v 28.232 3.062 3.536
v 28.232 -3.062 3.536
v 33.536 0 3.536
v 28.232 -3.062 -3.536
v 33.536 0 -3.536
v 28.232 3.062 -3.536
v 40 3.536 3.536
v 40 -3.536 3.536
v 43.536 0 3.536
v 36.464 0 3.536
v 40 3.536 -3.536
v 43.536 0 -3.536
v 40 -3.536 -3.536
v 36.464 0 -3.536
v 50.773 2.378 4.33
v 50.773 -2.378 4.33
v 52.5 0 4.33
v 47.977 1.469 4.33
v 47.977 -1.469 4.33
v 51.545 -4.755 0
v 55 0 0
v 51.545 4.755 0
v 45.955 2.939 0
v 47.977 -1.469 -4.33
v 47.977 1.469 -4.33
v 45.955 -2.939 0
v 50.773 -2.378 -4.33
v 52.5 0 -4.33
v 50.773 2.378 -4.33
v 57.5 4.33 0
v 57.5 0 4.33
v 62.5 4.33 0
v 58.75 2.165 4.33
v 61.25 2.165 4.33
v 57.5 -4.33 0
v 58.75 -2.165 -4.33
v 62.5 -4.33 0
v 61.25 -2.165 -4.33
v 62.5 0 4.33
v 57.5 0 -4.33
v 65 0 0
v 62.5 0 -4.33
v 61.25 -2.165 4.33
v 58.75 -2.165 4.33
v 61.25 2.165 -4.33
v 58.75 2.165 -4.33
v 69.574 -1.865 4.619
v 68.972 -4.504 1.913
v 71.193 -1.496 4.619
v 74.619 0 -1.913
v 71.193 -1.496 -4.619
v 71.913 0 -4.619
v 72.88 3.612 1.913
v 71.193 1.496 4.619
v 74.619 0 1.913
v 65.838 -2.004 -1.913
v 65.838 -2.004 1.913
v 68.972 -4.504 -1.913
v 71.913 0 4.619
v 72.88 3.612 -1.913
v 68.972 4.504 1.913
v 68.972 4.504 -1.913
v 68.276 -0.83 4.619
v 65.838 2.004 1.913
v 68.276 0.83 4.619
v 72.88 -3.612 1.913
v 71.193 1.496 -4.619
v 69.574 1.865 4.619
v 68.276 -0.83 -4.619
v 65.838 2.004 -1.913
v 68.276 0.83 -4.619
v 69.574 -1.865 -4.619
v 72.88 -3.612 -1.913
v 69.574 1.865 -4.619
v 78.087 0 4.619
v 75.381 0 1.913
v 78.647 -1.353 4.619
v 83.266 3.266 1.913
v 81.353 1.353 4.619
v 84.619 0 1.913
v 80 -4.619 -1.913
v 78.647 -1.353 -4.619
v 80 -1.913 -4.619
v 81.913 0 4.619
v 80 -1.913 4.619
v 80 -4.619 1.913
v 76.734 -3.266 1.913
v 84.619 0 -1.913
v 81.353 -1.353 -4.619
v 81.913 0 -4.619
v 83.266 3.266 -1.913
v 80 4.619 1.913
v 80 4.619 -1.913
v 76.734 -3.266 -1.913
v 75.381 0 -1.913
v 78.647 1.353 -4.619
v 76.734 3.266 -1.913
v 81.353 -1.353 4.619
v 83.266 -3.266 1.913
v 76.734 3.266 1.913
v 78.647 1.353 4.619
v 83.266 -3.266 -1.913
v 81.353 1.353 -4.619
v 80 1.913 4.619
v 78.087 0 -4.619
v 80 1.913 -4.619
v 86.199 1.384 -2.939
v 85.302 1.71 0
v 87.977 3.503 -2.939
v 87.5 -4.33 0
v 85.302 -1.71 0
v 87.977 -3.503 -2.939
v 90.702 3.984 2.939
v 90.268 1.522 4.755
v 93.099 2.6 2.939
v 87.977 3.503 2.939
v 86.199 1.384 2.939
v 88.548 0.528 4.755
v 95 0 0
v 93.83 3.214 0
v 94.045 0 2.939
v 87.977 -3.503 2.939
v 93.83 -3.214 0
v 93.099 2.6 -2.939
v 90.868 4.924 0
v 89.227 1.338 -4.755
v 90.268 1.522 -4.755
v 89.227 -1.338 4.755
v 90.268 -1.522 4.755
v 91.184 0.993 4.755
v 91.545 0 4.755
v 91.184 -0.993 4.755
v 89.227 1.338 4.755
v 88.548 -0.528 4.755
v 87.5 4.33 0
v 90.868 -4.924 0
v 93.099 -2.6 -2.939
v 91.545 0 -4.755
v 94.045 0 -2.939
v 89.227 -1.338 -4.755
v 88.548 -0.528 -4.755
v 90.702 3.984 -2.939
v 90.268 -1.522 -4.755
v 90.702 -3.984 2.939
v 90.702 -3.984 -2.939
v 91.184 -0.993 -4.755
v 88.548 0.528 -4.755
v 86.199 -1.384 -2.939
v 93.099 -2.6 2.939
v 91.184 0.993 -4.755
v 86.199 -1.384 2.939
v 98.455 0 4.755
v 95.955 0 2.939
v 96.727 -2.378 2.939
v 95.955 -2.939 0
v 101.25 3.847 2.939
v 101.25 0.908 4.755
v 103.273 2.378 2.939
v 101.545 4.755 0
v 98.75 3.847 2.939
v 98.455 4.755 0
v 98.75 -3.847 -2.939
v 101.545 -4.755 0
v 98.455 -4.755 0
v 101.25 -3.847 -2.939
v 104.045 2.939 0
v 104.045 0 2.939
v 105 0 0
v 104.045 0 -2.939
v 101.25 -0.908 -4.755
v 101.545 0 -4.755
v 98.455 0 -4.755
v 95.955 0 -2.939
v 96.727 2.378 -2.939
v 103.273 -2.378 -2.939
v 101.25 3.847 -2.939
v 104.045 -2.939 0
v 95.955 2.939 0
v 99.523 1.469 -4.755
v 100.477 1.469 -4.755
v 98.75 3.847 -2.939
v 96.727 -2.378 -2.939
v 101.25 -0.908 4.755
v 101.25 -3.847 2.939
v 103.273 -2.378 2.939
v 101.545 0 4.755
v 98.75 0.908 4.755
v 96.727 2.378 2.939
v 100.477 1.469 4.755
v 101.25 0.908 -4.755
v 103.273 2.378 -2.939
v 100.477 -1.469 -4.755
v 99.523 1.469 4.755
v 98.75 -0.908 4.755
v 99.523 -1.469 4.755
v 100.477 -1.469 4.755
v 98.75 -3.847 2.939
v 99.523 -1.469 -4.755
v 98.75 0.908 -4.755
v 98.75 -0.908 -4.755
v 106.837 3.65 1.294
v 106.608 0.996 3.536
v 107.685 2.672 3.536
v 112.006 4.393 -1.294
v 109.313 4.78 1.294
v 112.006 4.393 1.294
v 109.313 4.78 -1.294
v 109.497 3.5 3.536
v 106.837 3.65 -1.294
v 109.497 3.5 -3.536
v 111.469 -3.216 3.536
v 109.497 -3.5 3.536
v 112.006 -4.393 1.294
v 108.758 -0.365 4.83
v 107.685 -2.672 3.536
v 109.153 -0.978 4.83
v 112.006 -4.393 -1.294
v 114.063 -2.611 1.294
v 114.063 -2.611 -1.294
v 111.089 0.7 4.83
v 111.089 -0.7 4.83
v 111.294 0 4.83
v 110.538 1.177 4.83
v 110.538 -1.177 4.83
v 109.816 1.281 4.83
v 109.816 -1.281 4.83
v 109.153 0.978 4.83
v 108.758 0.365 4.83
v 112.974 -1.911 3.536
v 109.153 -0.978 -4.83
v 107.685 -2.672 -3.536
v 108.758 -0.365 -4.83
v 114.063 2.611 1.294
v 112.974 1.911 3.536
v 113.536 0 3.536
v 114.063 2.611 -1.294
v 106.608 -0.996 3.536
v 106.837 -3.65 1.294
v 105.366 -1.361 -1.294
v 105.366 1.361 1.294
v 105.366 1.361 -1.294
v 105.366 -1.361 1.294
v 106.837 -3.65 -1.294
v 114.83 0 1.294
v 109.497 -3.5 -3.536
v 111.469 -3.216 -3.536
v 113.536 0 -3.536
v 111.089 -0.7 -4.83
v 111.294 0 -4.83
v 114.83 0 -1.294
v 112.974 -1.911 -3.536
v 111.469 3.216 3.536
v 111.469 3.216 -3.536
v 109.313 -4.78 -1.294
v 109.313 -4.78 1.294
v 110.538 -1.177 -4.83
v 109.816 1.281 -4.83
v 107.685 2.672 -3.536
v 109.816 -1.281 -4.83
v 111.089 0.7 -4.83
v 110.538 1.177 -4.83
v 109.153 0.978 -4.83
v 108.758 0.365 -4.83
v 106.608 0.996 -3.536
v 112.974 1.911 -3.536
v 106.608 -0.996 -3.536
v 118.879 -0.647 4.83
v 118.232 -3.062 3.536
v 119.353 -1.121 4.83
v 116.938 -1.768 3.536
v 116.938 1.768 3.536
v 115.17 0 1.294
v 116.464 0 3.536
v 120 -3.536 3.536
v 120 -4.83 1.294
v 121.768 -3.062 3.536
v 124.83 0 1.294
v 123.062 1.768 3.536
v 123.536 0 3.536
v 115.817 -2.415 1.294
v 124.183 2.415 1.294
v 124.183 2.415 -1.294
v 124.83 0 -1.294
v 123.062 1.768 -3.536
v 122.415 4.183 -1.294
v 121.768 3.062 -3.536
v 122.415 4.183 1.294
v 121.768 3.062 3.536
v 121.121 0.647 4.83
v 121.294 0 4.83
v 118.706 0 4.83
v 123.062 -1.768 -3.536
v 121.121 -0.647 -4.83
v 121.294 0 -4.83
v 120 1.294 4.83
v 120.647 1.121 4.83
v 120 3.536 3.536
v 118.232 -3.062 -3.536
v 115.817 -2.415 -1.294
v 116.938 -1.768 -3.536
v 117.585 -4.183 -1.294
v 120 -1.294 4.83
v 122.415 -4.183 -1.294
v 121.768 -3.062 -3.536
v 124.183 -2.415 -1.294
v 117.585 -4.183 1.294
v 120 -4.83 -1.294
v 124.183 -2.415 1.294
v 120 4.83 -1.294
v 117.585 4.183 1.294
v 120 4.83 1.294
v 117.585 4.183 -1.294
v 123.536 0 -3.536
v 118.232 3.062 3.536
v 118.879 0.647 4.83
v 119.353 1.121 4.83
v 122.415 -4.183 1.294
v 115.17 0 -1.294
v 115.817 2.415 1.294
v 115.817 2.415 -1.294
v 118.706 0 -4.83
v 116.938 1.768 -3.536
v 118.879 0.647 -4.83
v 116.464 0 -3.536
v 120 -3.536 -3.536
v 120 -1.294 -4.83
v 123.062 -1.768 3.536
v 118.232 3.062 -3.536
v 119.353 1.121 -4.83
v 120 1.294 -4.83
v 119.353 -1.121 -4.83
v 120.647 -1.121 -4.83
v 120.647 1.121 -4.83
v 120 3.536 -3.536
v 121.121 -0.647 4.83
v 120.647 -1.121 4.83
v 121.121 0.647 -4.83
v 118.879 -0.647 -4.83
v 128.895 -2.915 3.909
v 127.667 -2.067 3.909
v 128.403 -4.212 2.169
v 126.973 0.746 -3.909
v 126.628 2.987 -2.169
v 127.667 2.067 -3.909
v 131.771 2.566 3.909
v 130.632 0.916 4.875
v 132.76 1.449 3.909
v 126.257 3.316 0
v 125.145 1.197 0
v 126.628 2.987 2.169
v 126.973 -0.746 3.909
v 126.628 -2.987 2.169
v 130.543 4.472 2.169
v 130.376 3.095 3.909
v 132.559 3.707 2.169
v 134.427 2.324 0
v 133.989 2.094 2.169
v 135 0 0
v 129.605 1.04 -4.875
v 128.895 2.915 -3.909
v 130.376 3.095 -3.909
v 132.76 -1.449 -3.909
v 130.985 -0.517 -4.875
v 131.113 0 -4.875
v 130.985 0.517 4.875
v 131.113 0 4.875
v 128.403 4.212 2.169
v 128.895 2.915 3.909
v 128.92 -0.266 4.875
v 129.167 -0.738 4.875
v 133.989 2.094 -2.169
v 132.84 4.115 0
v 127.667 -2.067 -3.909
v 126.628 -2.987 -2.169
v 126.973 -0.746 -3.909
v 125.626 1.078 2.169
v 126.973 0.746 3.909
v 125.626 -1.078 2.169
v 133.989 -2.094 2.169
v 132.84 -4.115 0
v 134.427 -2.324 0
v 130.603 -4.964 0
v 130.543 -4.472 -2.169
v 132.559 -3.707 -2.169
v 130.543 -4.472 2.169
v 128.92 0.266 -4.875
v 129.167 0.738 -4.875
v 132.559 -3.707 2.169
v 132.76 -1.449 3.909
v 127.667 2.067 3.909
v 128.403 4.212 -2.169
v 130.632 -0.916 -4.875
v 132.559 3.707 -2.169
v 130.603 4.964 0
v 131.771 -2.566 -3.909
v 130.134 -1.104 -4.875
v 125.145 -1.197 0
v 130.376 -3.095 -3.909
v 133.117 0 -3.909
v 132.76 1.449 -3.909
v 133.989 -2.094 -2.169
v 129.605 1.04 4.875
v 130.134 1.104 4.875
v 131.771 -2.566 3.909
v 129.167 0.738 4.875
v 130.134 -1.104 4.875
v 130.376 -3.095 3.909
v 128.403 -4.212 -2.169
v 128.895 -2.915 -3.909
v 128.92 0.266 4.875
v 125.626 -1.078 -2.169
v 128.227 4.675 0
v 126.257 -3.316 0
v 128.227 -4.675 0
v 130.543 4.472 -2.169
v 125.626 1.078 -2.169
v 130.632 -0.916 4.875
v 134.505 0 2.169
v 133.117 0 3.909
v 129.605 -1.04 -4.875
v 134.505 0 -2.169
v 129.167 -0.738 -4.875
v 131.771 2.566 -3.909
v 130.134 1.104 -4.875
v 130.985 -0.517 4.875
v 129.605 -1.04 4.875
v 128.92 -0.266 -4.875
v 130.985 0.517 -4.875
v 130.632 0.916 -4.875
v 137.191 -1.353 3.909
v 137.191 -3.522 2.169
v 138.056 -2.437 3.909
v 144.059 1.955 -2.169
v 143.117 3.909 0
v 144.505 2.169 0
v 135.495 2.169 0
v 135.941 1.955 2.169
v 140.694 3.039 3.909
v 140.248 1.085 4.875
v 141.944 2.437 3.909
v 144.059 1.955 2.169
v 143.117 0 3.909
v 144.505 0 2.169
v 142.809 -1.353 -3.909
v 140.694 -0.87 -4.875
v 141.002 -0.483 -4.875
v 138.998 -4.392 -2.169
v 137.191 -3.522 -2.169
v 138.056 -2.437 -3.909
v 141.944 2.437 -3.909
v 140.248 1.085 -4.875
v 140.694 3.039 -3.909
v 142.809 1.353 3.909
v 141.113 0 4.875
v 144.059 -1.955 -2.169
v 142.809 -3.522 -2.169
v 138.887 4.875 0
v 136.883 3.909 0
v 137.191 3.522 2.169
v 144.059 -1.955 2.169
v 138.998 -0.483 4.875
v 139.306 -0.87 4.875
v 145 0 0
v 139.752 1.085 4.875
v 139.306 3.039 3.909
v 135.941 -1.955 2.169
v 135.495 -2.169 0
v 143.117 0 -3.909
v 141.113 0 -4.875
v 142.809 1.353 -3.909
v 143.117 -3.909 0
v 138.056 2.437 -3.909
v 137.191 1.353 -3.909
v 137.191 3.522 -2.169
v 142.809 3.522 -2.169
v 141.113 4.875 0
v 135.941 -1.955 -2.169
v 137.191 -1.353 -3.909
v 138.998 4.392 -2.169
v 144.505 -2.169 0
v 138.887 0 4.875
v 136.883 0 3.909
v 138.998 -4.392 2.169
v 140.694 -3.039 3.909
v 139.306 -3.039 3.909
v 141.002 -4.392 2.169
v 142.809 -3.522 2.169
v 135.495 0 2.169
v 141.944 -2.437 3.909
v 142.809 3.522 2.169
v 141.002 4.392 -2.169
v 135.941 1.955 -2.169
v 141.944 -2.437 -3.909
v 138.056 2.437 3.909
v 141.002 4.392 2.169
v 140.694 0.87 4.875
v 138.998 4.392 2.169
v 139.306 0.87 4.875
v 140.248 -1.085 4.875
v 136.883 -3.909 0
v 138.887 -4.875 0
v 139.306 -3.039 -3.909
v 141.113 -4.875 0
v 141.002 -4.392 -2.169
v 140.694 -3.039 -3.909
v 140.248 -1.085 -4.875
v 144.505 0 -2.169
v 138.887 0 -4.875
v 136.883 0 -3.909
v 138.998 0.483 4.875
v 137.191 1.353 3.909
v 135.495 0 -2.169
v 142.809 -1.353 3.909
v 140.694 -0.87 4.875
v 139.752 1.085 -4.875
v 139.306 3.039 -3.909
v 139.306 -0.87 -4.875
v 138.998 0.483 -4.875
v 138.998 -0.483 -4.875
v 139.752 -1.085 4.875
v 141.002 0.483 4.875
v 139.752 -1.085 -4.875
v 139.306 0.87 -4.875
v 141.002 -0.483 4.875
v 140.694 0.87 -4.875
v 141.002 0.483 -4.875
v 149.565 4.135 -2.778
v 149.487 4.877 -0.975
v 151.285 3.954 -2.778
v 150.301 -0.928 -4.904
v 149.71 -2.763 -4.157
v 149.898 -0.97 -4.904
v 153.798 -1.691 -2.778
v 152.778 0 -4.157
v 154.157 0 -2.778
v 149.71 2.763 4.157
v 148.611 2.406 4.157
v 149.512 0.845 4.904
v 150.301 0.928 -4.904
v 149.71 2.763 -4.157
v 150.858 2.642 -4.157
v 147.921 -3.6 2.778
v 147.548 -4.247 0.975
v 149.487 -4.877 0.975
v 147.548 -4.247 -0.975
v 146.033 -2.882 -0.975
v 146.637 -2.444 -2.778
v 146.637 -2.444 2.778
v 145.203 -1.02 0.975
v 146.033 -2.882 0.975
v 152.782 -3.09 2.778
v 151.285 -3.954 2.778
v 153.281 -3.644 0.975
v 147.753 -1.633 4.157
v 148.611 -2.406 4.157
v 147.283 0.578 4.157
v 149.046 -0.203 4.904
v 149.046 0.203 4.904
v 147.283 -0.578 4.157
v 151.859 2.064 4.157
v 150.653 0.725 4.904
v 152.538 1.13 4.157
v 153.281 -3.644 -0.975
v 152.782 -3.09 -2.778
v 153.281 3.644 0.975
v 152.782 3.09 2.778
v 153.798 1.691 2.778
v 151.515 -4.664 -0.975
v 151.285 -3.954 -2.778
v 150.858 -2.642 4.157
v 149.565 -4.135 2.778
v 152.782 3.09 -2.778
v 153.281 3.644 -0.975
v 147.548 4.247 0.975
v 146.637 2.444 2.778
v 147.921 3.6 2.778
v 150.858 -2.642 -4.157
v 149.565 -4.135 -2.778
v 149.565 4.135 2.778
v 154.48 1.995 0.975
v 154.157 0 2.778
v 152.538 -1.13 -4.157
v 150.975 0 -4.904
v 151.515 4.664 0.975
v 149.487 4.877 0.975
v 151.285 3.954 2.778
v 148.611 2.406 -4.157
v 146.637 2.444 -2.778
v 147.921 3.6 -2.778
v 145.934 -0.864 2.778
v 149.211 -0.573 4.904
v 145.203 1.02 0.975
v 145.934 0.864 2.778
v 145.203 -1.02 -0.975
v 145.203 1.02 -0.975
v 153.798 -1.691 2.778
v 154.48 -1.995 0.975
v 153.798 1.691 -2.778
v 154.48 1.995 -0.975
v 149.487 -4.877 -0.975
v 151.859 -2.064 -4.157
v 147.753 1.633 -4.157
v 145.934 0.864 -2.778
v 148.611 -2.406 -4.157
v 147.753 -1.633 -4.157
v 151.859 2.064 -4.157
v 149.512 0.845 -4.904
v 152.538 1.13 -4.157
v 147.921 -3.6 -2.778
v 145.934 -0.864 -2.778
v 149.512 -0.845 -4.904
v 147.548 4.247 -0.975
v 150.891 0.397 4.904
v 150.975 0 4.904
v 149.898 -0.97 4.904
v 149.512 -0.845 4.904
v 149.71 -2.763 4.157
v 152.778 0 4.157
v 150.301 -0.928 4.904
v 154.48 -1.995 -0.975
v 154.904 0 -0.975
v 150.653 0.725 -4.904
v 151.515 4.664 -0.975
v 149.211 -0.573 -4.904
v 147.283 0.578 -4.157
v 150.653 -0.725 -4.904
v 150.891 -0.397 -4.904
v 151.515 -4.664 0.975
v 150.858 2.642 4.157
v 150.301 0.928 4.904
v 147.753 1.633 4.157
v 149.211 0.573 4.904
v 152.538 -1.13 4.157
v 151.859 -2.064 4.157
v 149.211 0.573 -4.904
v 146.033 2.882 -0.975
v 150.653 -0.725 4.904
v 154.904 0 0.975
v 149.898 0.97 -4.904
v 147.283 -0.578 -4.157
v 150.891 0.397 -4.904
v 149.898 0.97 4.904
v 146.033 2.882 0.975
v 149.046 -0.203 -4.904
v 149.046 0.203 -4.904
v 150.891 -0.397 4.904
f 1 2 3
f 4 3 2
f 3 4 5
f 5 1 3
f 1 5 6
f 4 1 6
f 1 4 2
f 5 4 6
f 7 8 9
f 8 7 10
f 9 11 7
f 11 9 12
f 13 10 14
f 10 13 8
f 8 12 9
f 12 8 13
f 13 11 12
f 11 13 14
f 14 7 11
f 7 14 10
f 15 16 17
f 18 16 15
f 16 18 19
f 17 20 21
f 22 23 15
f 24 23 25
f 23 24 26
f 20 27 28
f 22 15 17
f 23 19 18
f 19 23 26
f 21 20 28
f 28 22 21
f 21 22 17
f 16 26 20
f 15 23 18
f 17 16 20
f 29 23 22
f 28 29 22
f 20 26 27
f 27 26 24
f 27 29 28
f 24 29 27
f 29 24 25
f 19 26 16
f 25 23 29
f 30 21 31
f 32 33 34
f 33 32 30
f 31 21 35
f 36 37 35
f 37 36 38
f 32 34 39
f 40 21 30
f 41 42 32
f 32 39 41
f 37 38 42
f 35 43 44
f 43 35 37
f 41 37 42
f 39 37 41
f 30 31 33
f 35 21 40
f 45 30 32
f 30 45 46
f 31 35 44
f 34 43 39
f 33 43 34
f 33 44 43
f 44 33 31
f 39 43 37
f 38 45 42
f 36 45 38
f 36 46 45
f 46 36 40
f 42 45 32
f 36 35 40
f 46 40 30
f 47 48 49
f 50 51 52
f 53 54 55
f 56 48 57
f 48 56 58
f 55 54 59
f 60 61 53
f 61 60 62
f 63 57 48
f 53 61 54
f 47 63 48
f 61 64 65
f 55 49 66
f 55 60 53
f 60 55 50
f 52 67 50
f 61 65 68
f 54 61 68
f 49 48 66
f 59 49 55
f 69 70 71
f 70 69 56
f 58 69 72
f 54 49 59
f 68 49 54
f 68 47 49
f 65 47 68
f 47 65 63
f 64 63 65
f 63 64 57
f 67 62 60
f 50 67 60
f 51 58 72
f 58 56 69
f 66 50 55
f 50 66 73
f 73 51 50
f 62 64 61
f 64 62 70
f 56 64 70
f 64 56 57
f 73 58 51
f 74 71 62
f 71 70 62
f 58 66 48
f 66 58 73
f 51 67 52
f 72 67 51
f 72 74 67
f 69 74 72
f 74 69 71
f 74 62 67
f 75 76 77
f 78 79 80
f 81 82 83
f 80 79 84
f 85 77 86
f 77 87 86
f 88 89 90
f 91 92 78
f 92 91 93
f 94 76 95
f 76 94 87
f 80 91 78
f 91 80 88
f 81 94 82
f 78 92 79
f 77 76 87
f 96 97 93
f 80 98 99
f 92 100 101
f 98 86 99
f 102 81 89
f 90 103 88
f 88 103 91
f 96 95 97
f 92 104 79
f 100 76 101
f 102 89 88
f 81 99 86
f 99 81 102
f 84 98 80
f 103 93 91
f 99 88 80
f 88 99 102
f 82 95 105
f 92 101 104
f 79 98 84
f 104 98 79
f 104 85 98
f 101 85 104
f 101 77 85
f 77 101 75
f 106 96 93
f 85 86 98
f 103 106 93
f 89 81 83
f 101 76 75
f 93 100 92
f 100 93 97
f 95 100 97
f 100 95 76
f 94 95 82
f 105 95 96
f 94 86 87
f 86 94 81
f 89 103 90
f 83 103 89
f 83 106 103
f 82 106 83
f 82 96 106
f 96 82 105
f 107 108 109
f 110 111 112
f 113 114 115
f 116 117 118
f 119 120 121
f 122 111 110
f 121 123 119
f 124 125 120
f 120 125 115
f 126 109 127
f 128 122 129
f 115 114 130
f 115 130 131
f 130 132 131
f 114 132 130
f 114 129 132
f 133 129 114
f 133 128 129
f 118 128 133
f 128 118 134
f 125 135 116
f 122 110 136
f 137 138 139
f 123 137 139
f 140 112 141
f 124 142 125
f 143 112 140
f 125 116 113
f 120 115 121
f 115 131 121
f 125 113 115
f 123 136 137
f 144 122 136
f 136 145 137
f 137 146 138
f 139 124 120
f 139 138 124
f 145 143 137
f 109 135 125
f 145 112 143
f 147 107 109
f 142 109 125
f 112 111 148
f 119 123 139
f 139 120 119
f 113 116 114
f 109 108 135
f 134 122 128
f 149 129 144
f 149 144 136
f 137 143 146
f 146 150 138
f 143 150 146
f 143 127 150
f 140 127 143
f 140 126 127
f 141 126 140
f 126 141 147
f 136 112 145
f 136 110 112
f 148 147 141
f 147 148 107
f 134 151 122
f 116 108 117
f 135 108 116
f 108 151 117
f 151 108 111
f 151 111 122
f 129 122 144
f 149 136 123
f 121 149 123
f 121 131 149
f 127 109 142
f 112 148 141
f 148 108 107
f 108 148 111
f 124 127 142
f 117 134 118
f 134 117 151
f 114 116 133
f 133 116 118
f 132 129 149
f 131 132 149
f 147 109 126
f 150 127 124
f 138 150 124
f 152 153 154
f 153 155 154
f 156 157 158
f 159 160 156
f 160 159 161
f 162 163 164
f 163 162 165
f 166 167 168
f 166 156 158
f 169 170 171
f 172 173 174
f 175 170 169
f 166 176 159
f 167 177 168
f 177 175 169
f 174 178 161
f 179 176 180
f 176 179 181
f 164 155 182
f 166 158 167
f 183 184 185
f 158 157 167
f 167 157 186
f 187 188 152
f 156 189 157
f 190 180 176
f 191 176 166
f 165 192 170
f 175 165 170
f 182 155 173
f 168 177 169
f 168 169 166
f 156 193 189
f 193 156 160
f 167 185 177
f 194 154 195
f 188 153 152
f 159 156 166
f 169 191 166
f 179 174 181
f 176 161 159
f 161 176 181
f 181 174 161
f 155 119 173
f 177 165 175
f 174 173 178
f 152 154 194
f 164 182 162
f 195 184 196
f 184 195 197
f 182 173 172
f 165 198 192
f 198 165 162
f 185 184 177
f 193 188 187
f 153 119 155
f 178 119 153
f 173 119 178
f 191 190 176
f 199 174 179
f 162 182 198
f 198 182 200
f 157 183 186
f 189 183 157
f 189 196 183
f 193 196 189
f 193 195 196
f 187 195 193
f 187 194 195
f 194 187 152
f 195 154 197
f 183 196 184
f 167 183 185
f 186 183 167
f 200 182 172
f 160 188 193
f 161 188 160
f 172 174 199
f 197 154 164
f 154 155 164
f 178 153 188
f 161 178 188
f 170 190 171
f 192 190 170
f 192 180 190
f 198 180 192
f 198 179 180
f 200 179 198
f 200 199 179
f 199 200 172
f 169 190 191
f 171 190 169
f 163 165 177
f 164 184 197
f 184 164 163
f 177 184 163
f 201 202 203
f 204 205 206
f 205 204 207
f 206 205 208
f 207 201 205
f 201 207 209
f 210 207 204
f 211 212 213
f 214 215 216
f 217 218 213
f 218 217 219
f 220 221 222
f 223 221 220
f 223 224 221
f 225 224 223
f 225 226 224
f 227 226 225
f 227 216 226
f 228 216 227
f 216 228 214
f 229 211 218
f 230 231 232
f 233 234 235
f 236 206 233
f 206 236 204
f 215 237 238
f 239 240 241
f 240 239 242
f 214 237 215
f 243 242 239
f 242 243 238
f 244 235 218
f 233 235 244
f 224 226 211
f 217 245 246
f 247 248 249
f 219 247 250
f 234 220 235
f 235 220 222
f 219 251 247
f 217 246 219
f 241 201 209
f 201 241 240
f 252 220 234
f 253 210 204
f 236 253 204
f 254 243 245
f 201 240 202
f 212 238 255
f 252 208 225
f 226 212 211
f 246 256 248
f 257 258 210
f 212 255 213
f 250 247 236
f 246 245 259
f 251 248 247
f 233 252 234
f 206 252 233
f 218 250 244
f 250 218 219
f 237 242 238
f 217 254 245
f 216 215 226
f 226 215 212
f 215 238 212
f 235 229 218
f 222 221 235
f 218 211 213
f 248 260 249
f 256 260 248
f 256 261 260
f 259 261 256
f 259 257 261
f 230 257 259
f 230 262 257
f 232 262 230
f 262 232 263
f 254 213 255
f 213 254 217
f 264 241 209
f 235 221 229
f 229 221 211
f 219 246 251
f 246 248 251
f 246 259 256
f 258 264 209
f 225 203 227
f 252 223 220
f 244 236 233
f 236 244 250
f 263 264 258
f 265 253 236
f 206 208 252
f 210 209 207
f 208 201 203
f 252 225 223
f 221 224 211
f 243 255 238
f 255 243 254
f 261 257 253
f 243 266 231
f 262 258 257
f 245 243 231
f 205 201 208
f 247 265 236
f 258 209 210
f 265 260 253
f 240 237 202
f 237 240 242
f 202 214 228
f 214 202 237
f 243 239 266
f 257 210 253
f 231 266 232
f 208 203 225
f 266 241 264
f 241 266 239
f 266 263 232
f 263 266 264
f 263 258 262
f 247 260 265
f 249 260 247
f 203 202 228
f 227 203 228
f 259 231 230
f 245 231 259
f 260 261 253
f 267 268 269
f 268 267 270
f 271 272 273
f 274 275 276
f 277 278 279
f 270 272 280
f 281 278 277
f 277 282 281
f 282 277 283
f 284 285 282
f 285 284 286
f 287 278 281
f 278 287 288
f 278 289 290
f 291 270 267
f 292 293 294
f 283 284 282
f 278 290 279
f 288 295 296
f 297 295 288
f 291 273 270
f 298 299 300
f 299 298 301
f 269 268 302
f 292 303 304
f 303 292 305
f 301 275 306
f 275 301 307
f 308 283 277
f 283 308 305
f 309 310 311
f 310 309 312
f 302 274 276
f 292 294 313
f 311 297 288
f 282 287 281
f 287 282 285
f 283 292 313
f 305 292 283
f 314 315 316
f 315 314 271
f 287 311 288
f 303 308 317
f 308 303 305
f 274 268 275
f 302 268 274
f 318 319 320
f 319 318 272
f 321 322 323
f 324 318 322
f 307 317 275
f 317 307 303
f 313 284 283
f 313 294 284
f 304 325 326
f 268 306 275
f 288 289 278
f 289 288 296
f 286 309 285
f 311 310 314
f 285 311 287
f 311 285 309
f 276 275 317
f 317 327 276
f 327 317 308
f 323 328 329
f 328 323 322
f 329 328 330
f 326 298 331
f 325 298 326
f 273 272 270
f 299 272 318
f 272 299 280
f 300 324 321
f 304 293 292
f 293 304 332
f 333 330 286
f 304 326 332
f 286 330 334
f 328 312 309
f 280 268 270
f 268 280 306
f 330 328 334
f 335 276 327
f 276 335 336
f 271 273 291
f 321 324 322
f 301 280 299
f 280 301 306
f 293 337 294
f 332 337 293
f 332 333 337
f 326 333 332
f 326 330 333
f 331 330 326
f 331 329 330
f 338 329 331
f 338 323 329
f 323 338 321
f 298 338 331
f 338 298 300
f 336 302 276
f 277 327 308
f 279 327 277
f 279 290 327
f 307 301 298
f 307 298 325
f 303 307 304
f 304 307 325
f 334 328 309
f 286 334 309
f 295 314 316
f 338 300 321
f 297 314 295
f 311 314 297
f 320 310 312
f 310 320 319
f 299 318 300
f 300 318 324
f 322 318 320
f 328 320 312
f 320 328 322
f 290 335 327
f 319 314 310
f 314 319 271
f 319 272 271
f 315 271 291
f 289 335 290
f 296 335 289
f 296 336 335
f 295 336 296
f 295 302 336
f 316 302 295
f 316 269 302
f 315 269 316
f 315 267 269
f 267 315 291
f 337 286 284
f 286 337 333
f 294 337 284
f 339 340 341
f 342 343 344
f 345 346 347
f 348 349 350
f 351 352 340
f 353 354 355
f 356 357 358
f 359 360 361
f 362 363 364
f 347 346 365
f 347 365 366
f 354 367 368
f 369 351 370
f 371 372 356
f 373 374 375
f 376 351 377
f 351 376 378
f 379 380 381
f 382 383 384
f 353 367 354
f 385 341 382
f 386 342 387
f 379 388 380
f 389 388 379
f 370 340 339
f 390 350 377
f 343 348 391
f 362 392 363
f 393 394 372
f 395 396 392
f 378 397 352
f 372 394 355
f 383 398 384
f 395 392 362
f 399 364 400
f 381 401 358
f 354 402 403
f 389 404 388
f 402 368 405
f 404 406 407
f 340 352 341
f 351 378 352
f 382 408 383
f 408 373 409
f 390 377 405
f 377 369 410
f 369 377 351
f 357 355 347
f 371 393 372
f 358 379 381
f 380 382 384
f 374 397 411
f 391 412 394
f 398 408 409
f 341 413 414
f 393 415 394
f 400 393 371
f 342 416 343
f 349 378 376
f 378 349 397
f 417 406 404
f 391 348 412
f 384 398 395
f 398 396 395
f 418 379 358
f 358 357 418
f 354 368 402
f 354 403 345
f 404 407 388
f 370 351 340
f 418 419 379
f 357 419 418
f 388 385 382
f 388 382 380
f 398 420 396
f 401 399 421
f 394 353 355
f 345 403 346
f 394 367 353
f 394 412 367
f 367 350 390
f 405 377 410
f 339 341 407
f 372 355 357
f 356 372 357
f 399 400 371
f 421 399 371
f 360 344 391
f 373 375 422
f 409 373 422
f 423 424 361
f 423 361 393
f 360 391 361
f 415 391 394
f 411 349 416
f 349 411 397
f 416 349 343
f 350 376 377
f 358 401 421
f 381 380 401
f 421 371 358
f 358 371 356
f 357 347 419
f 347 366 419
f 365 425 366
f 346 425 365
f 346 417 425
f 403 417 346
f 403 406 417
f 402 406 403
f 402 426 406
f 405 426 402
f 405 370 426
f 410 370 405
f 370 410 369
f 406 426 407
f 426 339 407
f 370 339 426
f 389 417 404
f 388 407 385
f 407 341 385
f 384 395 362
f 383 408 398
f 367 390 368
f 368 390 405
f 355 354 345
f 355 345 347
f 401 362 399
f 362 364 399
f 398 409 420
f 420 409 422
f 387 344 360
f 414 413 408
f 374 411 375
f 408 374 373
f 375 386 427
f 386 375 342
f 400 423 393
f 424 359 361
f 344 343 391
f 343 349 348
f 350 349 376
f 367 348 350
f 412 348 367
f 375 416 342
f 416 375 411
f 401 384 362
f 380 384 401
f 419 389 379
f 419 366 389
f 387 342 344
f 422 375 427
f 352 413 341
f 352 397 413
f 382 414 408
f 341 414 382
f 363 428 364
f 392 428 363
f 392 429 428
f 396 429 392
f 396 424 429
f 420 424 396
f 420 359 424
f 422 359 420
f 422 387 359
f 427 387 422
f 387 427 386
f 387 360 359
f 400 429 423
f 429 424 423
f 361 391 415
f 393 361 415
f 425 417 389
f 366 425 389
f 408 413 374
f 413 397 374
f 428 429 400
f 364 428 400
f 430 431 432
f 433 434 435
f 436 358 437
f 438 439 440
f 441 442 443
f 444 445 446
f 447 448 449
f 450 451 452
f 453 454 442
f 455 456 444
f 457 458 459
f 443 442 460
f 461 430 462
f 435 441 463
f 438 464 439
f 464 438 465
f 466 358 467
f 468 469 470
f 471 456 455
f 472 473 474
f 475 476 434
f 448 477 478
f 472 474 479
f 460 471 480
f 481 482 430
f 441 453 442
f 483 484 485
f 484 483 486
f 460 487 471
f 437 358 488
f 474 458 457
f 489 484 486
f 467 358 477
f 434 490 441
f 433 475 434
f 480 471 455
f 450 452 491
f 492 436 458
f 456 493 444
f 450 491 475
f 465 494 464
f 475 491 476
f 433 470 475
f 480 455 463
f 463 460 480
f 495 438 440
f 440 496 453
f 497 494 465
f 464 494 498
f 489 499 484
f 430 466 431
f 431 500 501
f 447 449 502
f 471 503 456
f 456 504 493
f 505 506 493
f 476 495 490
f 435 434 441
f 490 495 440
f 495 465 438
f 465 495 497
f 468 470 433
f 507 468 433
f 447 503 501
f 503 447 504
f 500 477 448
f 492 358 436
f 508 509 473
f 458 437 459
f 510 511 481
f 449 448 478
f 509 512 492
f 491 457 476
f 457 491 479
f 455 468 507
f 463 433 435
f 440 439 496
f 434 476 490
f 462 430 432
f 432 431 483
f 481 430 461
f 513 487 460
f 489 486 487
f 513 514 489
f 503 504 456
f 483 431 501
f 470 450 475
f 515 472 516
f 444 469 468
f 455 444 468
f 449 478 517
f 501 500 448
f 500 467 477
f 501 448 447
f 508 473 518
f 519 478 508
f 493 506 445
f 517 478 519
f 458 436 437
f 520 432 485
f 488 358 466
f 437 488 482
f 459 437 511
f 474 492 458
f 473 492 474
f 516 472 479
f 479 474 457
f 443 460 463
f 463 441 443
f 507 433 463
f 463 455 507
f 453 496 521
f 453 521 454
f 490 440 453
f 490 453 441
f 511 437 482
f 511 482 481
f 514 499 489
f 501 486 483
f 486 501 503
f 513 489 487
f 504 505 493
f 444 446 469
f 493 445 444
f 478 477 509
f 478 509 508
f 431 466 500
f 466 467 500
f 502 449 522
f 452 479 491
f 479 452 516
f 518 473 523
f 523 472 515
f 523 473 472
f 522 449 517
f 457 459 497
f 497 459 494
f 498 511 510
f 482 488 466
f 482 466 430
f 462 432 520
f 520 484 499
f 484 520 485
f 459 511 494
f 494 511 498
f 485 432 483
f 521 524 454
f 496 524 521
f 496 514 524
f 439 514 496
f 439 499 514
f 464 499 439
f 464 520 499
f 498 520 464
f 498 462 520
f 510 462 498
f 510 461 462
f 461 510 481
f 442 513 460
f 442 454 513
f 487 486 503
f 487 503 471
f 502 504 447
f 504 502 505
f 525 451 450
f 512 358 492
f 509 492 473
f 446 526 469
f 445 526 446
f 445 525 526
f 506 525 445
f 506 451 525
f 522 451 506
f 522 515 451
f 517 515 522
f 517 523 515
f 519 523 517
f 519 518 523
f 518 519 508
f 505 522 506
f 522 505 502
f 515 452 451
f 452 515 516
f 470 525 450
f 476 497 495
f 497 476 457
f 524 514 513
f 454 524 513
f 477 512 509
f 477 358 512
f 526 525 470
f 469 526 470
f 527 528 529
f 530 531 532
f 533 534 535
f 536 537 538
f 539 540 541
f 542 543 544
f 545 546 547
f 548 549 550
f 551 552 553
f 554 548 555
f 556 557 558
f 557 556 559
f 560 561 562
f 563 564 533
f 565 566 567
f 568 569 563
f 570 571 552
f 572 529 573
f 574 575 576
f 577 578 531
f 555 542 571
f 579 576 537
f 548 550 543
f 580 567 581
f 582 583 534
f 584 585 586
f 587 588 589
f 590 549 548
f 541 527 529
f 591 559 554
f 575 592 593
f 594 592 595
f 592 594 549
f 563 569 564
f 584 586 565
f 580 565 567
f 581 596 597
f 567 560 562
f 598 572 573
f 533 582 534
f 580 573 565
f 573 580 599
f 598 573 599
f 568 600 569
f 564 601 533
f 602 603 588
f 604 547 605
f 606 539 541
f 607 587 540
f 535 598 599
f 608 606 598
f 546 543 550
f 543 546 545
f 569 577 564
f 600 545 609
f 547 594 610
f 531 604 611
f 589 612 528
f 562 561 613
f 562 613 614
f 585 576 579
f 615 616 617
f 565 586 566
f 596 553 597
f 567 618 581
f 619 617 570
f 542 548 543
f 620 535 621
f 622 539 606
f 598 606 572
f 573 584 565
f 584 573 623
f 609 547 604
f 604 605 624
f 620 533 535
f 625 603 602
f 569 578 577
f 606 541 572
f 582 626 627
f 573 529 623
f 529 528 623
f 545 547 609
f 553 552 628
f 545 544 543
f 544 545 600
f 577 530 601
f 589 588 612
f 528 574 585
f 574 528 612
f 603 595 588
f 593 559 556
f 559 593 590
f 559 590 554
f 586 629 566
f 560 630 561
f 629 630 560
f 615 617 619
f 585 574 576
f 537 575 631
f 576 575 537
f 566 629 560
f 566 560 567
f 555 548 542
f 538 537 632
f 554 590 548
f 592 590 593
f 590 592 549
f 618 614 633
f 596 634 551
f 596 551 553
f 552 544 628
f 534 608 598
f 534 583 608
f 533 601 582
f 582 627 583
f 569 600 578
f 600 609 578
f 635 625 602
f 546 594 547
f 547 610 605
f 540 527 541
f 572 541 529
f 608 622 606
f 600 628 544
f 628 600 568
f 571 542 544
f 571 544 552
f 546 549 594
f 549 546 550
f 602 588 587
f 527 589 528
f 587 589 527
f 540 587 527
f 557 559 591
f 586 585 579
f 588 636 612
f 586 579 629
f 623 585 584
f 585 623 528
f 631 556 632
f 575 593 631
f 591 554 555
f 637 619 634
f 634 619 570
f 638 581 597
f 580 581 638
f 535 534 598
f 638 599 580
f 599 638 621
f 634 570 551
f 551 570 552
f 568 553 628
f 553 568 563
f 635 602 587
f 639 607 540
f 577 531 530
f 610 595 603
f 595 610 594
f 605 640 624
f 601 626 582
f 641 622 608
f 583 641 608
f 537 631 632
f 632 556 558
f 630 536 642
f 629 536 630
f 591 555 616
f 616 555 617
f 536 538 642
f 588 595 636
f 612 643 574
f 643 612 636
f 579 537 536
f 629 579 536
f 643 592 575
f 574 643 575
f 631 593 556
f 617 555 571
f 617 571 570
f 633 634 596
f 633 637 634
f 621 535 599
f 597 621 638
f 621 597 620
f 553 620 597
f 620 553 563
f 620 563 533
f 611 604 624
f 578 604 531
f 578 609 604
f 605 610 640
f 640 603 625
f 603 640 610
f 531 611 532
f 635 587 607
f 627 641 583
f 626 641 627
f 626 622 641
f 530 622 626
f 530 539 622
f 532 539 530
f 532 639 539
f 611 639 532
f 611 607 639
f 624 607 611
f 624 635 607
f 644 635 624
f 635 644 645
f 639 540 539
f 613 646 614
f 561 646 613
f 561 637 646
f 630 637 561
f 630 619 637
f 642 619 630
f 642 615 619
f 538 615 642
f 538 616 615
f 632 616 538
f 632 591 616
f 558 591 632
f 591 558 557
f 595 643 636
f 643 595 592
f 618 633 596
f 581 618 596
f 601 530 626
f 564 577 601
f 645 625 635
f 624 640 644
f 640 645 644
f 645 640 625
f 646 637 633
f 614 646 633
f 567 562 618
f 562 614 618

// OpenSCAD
for (faces=[3:1:15]) {
  $fn=faces;
  x_position = faces * 10;
  translate([x_position, 0, 0]) {
    sphere(r=5);
  }
  echo(str("faces:", faces, " x-position:", x_position));
}
